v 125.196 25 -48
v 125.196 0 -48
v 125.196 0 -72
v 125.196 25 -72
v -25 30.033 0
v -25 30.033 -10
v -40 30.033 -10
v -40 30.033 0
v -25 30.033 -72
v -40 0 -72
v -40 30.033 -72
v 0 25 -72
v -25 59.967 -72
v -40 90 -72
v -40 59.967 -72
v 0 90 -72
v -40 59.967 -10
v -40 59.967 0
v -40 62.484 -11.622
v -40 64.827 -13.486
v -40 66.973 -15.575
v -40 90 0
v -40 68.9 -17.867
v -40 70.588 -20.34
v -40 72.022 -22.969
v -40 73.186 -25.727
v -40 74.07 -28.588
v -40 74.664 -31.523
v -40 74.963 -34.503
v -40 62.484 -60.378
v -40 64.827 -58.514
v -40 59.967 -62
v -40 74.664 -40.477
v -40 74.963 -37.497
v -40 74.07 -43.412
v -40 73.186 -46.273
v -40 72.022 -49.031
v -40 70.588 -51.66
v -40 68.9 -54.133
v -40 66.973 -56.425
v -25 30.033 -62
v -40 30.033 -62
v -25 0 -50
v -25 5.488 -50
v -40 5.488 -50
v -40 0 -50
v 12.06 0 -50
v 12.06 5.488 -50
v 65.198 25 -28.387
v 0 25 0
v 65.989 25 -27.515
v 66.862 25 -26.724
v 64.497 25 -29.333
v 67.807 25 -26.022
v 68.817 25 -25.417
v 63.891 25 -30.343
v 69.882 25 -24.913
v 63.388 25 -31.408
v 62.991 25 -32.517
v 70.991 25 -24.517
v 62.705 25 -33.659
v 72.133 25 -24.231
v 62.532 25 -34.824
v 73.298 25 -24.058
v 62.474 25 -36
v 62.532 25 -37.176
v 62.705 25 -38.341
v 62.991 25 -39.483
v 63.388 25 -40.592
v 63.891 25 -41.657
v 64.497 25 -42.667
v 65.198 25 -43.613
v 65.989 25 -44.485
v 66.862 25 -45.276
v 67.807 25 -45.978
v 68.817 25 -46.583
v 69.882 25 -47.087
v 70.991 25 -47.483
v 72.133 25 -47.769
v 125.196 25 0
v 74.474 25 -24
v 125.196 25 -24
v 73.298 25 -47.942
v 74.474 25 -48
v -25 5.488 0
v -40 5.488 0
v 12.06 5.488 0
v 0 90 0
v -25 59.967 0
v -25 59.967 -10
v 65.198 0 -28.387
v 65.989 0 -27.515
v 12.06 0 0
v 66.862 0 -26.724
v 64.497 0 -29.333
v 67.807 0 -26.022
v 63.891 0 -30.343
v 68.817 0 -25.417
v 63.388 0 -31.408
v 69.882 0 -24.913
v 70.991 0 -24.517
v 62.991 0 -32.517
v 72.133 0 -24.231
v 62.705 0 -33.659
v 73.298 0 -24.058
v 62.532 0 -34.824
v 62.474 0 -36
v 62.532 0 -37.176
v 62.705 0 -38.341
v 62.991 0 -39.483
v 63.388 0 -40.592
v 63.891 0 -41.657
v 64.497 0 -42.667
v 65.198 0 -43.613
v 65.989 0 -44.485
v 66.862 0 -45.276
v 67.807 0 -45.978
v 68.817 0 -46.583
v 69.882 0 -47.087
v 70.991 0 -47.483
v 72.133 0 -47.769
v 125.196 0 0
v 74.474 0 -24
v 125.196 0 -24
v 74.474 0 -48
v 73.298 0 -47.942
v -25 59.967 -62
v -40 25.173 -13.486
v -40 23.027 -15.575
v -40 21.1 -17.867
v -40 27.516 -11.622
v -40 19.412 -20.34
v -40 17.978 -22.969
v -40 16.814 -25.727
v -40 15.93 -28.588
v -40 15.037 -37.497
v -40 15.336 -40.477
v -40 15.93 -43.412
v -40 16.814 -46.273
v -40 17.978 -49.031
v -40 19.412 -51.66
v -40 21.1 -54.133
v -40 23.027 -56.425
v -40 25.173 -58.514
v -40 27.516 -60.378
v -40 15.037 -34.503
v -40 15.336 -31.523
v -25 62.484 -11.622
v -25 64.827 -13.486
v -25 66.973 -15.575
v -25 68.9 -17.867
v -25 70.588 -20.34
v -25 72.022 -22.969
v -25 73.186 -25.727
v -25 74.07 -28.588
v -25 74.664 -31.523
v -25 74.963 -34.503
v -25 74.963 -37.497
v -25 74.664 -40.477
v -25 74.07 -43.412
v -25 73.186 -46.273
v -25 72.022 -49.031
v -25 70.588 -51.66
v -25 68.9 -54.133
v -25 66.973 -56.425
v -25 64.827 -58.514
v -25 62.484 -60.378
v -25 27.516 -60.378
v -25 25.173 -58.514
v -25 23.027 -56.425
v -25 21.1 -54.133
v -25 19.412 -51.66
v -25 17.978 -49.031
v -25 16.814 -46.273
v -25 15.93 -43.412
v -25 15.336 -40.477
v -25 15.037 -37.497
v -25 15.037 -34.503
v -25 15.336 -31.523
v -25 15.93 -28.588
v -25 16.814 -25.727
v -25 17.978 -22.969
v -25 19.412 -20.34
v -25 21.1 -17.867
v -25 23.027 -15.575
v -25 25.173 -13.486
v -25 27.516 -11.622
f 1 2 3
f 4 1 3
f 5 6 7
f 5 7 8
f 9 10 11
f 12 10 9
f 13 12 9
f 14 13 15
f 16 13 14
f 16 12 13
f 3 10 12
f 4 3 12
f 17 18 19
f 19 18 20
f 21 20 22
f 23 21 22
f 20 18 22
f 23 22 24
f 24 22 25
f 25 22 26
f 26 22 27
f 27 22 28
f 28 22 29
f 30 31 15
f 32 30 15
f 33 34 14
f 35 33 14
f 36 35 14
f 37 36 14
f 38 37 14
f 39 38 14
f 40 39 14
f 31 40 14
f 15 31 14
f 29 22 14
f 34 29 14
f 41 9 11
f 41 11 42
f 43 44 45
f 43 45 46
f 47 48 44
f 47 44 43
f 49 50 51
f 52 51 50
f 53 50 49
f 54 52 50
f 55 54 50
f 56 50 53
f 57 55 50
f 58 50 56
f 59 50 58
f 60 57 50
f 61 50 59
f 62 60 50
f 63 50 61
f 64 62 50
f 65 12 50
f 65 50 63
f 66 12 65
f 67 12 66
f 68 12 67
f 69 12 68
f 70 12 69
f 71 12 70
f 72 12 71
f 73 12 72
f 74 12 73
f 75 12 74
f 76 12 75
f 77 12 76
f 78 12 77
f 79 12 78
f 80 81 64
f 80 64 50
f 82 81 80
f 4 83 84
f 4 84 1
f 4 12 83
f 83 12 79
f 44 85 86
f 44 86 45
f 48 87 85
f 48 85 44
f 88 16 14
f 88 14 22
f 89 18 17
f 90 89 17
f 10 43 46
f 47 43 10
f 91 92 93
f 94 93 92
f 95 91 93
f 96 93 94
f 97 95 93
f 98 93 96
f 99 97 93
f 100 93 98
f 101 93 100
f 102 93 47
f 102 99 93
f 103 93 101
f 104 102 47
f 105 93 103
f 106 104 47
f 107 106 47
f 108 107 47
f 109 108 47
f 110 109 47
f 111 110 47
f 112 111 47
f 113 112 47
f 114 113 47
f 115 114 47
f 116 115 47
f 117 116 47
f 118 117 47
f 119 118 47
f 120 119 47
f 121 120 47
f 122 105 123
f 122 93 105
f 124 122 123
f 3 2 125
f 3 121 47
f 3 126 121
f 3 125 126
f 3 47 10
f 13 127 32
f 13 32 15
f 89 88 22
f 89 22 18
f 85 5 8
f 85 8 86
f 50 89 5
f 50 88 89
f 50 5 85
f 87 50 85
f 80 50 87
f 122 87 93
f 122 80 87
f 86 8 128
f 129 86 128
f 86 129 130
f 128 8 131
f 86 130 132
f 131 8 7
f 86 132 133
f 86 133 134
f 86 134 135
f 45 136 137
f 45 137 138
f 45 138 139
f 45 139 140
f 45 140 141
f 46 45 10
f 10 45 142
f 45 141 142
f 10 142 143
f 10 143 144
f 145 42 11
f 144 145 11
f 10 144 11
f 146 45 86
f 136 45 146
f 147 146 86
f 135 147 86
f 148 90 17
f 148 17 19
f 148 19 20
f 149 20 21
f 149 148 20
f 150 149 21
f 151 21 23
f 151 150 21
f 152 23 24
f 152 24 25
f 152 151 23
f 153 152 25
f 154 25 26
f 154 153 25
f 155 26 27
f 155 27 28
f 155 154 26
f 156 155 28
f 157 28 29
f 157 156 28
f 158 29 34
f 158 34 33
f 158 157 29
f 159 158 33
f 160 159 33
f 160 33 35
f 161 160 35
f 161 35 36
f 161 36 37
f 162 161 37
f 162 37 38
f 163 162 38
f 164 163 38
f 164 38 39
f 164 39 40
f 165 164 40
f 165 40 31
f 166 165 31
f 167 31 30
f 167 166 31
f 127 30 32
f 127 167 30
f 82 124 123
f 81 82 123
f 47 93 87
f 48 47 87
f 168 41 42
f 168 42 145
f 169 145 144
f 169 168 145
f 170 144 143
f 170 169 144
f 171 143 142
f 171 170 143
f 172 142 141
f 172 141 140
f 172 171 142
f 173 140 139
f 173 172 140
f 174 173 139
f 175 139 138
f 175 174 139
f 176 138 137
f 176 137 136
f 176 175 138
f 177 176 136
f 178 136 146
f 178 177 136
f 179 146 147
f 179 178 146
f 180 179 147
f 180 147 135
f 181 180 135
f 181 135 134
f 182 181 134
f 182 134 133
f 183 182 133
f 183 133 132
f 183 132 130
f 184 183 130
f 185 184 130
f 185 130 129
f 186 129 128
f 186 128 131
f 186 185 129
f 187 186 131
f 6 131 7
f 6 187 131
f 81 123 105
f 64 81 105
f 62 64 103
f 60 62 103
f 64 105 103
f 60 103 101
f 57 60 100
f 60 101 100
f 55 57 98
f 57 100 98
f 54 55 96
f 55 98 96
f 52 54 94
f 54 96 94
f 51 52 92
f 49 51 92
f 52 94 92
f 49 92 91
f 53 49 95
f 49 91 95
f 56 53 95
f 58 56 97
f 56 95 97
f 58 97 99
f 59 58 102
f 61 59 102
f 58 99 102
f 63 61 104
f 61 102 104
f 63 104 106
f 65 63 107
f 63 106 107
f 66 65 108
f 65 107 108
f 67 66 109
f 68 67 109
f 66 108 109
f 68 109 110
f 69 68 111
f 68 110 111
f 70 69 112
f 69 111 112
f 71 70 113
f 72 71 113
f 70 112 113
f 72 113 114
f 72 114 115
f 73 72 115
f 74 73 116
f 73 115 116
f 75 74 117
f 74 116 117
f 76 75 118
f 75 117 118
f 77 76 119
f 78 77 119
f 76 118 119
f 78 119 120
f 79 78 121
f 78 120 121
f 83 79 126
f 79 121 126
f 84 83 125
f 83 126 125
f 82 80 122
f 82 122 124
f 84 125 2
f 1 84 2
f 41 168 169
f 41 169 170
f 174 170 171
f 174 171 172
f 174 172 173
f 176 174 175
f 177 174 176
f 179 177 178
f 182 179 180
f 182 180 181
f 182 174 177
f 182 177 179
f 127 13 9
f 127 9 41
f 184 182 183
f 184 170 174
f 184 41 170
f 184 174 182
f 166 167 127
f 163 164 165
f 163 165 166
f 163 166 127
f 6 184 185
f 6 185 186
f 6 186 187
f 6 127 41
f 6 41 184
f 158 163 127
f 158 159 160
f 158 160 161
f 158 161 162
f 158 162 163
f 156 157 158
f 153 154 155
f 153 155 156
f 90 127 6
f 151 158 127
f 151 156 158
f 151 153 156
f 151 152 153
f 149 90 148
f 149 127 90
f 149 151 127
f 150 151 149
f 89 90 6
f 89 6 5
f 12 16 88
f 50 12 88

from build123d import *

# Parameters (mm, degrees)
BOSS_EXTRUDE1_DEPTH = 25
SKETCH3_W           = 72
SKETCH3_H           = 90
BOSS_EXTRUDE2_DEPTH = 25
SKETCH4_W           = 37.059895825
SKETCH4_H           = 5.488186397
CUT_EXTRUDE1_DEPTH  = 50
BOSS_EXTRUDE3_DEPTH = 15


with BuildPart() as part:
    # Sketch2 → Boss-Extrude1 (new body)
    with BuildSketch(Plane(origin=(0, 0, 0), x_dir=(1, 0, 0), z_dir=(0, 1, 0))):
        with BuildLine():
            Line((0, 0), (62.597938144, 0))
            Line((62.597938144, 0), (125.195876289, 0))
            Line((125.195876289, 0), (125.195876289, 24))
            Line((125.195876289, 24), (74.474226804, 24))
            ThreePointArc((74.474226804, 24), (62.474226804, 36), (74.474226804, 48))
            Line((74.474226804, 48), (125.195876289, 48))
            Line((125.195876289, 48), (125.195876289, 72))
            Line((125.195876289, 72), (0, 72))
            Line((0, 72), (0, 0))
        make_face()
    extrude(amount=BOSS_EXTRUDE1_DEPTH)

    # Sketch3 → Boss-Extrude2 (add)
    with BuildSketch(Plane.ZY):
        with Locations((-36, 45)):
            Rectangle(SKETCH3_W, SKETCH3_H)
    extrude(amount=BOSS_EXTRUDE2_DEPTH)

    # Sketch4 → Cut-Extrude1 (cut)
    with BuildSketch(Plane.XY):
        with Locations((-6.470052088, 2.744093199)):
            Rectangle(SKETCH4_W, SKETCH4_H)
    extrude(amount=-CUT_EXTRUDE1_DEPTH, mode=Mode.SUBTRACT)

    # Sketch5 → Boss-Extrude3 (add)
    with BuildSketch(Plane.ZY.offset(25)):
        with BuildLine():
            Line((0, 5.488186397), (-50, 5.488186397))
            Line((-50, 5.488186397), (-50, 0))
            Line((-50, 0), (-72, 0))
            Line((-72, 0), (-72, 30.033370453))
            Line((-72, 30.033370453), (-62, 30.033370453))
            ThreePointArc((-62, 30.033370453), (-36, 15), (-10, 30.033370453))
            Line((-10, 30.033370453), (0, 30.033370453))
            Line((0, 30.033370453), (0, 5.488186397))
        make_face()
        with BuildLine():
            Line((-50, 90), (0, 90))
            Line((0, 90), (0, 84.511813603))
            Line((0, 84.511813603), (0, 59.966629547))
            Line((0, 59.966629547), (-10, 59.966629547))
            ThreePointArc((-10, 59.966629547), (-36, 75), (-62, 59.966629547))
            Line((-62, 59.966629547), (-72, 59.966629547))
            Line((-72, 59.966629547), (-72, 90))
            Line((-72, 90), (-50, 90))
        make_face()
    extrude(amount=BOSS_EXTRUDE3_DEPTH)


solid = part.part
